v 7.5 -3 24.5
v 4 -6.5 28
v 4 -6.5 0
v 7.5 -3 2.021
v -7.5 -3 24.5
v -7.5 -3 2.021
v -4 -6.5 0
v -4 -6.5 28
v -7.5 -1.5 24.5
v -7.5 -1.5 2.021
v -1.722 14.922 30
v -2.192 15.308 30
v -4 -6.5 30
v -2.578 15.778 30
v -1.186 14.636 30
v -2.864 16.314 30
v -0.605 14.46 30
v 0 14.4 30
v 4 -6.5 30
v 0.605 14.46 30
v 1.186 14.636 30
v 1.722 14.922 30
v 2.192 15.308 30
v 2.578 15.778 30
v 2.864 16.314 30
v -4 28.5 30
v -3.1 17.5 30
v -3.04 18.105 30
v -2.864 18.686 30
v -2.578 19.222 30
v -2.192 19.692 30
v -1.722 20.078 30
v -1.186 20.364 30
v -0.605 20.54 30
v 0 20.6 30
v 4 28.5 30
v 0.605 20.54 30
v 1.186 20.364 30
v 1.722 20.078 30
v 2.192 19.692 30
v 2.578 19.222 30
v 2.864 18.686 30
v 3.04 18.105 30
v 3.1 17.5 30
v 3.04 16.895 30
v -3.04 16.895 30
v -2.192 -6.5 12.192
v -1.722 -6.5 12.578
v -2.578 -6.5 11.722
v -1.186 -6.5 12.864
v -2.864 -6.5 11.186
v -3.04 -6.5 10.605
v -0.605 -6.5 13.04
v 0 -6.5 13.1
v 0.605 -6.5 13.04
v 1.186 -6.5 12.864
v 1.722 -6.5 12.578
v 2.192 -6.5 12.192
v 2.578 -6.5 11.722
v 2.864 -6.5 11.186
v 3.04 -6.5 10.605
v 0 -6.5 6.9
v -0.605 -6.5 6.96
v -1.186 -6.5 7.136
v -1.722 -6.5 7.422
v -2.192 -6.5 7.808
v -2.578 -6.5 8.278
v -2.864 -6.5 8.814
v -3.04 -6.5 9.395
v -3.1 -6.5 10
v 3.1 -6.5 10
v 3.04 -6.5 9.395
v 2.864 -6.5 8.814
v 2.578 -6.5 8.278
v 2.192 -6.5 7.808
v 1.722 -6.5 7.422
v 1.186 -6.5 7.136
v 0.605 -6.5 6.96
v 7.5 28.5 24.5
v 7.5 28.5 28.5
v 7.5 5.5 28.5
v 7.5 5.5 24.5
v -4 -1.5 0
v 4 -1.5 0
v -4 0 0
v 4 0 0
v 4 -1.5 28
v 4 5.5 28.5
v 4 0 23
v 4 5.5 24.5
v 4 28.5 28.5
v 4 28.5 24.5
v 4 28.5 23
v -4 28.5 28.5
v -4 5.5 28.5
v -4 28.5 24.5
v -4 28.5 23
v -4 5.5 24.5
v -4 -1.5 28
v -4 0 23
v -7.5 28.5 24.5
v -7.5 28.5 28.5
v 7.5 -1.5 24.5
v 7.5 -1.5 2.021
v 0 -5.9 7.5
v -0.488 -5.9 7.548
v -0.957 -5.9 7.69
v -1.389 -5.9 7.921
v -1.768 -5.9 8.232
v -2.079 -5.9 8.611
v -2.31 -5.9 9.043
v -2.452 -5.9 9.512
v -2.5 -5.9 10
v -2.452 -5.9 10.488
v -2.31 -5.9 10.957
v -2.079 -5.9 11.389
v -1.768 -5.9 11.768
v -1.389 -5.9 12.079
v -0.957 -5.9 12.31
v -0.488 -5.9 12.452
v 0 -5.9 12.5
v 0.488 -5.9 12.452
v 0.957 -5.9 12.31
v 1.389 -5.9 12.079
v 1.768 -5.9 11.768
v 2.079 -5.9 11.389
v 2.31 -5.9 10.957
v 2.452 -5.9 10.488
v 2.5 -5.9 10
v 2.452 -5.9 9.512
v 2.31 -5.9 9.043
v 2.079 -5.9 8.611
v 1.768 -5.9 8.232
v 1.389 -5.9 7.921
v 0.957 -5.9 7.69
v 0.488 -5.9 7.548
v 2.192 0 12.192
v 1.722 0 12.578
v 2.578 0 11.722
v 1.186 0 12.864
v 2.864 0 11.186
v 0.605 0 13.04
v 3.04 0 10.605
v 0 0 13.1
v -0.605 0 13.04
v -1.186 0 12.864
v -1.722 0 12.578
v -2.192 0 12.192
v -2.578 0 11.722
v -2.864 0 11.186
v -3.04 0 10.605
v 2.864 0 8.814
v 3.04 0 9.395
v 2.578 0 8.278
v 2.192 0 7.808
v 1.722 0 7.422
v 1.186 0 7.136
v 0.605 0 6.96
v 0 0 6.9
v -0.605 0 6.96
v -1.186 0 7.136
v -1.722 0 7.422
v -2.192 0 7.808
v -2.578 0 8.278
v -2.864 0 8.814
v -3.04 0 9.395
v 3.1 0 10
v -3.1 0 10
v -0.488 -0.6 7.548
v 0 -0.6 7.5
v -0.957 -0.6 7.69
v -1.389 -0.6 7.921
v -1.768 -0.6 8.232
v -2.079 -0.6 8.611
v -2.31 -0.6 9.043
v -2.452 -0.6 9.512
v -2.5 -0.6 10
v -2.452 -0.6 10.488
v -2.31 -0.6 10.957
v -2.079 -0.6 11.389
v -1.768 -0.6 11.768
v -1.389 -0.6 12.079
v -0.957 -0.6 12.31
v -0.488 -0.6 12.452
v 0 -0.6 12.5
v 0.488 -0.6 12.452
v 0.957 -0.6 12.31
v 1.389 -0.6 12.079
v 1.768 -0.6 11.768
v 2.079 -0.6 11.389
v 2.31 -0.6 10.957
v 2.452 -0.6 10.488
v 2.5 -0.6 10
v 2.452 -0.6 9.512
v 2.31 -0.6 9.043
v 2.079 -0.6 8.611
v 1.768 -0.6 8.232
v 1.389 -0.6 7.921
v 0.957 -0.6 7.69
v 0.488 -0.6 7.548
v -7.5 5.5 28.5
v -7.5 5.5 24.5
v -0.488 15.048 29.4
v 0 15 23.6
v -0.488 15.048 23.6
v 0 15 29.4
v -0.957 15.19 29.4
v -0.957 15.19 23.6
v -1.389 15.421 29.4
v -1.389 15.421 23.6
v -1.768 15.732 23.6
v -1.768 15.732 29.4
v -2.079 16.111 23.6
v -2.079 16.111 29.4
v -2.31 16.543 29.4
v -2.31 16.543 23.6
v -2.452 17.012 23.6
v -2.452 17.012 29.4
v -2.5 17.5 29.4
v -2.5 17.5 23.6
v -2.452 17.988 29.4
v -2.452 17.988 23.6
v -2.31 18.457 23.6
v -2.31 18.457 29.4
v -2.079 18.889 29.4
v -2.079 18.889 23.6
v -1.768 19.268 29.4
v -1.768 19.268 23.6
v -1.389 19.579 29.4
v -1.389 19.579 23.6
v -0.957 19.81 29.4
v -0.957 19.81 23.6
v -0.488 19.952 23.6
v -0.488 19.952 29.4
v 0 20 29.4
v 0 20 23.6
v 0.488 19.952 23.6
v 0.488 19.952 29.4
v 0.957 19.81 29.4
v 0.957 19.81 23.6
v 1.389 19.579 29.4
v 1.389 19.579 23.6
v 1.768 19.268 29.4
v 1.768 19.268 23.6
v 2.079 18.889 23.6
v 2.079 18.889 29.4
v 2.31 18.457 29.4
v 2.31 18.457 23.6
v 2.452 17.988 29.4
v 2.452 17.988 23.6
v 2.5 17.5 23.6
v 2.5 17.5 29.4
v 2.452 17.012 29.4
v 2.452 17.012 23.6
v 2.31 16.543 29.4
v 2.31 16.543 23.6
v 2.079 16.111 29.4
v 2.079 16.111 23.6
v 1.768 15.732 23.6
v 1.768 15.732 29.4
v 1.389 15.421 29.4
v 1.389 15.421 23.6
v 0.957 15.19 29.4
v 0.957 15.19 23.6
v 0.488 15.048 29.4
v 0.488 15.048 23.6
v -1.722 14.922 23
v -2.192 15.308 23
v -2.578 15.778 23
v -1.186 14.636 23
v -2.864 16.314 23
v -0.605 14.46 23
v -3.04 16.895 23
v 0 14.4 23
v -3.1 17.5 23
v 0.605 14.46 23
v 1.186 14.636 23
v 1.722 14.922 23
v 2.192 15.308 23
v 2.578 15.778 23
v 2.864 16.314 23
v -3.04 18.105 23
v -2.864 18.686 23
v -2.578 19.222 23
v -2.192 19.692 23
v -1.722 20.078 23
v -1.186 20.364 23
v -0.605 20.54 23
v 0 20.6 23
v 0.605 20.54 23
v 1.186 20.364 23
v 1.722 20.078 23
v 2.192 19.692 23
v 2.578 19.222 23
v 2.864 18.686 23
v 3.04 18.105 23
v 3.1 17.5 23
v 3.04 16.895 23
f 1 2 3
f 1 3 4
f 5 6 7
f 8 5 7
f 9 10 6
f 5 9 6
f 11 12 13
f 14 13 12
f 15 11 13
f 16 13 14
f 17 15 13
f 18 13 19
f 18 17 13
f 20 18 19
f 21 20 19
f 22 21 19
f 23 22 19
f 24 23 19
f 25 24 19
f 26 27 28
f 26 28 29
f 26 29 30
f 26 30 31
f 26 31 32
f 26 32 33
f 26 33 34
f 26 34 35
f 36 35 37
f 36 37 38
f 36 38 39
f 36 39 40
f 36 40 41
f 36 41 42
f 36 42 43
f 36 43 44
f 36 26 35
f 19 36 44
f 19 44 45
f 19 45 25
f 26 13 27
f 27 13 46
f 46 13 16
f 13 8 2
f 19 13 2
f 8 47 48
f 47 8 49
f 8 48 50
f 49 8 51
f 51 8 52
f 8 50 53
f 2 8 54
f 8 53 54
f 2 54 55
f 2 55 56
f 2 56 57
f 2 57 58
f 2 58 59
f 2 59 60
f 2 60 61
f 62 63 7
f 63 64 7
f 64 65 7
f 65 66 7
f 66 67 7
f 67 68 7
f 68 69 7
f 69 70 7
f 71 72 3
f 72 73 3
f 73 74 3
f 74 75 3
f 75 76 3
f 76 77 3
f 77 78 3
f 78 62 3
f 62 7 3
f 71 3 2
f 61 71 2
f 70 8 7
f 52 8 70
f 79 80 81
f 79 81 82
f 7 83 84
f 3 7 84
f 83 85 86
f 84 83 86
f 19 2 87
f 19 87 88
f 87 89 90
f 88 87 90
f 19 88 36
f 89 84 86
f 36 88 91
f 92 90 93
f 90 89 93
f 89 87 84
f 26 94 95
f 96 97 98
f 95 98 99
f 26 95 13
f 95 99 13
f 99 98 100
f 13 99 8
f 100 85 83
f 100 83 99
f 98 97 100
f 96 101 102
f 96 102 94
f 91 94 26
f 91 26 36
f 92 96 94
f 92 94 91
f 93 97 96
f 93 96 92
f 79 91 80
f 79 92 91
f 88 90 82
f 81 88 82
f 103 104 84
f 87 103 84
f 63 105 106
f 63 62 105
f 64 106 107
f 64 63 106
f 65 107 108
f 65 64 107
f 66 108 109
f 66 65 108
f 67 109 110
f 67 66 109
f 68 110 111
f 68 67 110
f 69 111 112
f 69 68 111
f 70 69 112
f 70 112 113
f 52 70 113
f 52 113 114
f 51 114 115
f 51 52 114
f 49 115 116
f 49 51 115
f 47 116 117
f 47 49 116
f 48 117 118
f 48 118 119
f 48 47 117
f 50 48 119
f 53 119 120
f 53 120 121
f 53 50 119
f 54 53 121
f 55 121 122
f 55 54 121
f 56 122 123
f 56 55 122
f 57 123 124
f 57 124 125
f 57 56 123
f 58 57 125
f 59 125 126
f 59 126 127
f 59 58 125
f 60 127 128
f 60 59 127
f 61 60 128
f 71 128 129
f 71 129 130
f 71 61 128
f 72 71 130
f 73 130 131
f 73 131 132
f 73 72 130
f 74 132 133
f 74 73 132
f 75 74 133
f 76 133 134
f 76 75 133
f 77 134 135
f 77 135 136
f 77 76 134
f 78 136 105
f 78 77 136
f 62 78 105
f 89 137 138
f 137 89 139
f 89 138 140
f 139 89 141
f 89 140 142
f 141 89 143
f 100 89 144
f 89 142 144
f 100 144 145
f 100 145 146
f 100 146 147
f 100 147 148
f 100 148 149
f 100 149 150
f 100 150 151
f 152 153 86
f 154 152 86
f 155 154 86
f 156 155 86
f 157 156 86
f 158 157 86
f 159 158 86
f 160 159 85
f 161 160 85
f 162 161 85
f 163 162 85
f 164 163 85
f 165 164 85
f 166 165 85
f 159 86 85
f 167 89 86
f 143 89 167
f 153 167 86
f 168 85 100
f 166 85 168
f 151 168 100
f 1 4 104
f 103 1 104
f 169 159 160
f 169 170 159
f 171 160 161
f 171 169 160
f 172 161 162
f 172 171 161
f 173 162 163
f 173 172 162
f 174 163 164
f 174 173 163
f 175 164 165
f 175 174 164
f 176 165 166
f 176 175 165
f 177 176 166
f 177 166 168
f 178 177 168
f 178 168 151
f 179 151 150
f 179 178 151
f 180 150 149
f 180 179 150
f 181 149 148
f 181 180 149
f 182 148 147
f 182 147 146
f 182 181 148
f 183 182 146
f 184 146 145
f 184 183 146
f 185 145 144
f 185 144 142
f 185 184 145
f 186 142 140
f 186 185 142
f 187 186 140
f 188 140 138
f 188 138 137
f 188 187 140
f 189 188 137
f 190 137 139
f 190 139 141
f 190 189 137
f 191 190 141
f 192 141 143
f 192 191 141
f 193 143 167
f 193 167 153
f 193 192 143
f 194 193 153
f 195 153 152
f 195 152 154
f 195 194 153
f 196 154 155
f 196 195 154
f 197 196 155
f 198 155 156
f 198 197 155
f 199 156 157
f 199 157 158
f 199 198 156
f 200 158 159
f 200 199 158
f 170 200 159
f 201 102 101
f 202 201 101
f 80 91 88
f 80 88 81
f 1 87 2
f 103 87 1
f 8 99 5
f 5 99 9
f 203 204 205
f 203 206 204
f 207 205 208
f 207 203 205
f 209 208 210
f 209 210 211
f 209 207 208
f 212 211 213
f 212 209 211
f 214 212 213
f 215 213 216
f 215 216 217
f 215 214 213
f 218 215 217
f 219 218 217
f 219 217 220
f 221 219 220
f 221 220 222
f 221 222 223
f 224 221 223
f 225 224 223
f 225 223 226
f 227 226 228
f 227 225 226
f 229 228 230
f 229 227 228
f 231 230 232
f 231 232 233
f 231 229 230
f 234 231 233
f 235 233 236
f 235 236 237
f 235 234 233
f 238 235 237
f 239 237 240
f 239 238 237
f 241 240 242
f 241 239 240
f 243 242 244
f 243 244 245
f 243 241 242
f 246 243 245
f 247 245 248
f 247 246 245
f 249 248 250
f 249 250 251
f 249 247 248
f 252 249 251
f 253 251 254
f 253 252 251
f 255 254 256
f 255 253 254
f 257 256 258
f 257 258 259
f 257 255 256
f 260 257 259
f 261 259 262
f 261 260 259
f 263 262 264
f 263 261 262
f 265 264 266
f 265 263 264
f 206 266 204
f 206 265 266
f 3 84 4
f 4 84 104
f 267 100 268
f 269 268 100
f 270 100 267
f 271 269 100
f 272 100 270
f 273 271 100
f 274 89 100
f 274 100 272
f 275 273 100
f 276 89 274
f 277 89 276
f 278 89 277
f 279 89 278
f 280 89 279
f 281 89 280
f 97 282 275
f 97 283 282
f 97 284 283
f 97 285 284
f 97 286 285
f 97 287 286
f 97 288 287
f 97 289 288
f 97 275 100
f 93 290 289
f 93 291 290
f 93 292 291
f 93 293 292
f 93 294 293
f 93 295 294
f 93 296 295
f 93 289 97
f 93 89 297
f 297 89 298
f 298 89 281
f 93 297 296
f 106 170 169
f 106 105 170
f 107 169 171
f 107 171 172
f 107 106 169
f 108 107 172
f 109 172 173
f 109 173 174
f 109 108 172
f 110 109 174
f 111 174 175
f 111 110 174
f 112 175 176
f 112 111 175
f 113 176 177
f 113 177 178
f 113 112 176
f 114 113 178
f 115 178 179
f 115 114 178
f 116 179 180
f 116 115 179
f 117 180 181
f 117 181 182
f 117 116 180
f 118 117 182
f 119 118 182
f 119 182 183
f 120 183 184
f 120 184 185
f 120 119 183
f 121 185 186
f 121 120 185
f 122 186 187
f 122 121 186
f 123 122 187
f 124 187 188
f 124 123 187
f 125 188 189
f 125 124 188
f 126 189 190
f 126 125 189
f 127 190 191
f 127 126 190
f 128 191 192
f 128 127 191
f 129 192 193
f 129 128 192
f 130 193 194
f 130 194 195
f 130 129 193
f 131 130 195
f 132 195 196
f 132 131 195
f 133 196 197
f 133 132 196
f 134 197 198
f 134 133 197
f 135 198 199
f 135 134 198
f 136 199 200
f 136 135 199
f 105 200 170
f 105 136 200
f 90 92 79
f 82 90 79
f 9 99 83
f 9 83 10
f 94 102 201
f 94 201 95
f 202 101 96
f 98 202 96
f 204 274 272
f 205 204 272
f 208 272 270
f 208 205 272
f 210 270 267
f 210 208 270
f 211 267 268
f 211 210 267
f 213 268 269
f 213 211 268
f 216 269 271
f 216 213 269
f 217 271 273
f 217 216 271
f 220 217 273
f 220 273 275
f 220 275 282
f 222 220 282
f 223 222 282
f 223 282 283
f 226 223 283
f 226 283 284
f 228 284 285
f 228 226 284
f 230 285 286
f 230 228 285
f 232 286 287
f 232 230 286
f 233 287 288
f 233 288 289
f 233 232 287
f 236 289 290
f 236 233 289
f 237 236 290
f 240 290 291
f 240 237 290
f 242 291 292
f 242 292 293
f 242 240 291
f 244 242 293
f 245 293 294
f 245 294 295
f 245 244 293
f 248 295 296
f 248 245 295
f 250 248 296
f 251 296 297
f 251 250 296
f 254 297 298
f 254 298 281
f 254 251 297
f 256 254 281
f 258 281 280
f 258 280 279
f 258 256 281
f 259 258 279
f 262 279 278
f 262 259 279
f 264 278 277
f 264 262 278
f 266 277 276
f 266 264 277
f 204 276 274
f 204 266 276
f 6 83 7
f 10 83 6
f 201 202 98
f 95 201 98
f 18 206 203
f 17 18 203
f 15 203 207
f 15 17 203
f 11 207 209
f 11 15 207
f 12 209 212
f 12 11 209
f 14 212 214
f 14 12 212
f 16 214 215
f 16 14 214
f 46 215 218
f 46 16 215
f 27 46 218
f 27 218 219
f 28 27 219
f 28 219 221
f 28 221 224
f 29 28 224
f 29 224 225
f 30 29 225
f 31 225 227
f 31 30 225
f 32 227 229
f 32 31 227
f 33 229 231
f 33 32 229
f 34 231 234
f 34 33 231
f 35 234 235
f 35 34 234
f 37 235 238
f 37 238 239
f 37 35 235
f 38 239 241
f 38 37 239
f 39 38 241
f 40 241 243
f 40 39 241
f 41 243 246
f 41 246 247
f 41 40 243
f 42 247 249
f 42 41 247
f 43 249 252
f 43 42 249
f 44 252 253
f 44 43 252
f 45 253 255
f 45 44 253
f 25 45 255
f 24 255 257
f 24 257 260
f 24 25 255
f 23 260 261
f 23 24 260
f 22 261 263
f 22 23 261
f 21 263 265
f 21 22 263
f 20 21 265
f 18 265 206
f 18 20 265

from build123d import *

# Parameters (mm, degrees)
EXTRUDE_1_DEPTH     = 30
SKETCH_2_W          = 7
SKETCH_2_H          = 35
EXTRUDE_2_DEPTH     = 4
CUT_EXTRUDE_1_DEPTH = 6
SKETCH_4_W          = 15
SKETCH_4_H          = 4
EXTRUDE_3_DEPTH     = 23


with BuildPart() as part:
    # Эскиз1 → Бобышка-Вытянуть1 (new body)
    with BuildSketch(Plane.XY):
        Polygon((4, 0), (-4, 0), (-4, -1.5), (-7.5, -1.5), (-7.5, -3), (-4, -6.5), (4, -6.5), (7.5, -3), (7.5, -1.5), (4, -1.5), align=None)
    extrude(amount=EXTRUDE_1_DEPTH)

    # Эскиз2 → Бобышка-Вытянуть2 (add, symmetric)
    with BuildSketch(Plane(origin=(0, 0, 0), x_dir=(0, 0, -1), z_dir=(1, 0, 0))):
        with Locations((-26.5, 11)):
            Rectangle(SKETCH_2_W, SKETCH_2_H)
    extrude(amount=EXTRUDE_2_DEPTH, both=True)

    # Эскиз3 → Вырез-Вытянуть1 (cut, through all)
    with BuildSketch(Plane(origin=(0, -1.5, 0), x_dir=(1, 0, 0), z_dir=(0, 1, 0))):
        Polygon((-4, 0), (-7.5, -2.020725942), (-7.5, 0), align=None)
        Polygon((-4, -28), (-7.5, -24.5), (-7.5, -30), (-4, -30), align=None)
        Polygon((4, -30), (4, -28), (7.5, -24.5), (7.5, -30), align=None)
        Polygon((7.5, 0), (4, 0), (7.5, -2.020725942), align=None)
    extrude(amount=-CUT_EXTRUDE_1_DEPTH, mode=Mode.SUBTRACT)

    # Эскиз4 → Бобышка-Вытянуть3 (add)
    with BuildSketch(Plane(origin=(0, 28.5, 0), x_dir=(1, 0, 0), z_dir=(0, 1, 0))):
        with Locations((0, -26.5)):
            Rectangle(SKETCH_4_W, SKETCH_4_H)
    extrude(amount=-EXTRUDE_3_DEPTH)

    # Эскиз6 → Отверстие обработанное метчиком M61 (revolve, cut)
    with BuildSketch(Plane(origin=(0, -6.5, 10), x_dir=(0, 0, -1), z_dir=(1, 0, 0))):
        Polygon((0, 0), (0, 6.5), (3.1, 6.5), (2.5, 5.9), (2.5, 0.6), (3.1, 0), align=None)
    revolve(axis=Axis((0, -12.85, 10), (0, 1, 0)), mode=Mode.SUBTRACT)

    # Эскиз8 → Отверстие обработанное метчиком M62 (revolve, cut)
    with BuildSketch(Plane(origin=(0, 17.5, 30), x_dir=(0, -1, 0), z_dir=(1, 0, 0))):
        Polygon((0, 0), (0, 7), (3.1, 7), (2.5, 6.4), (2.5, 0.6), (3.1, 0), align=None)
    revolve(axis=Axis((0, 17.5, 36.35), (0, 0, -1)), mode=Mode.SUBTRACT)


solid = part.part
